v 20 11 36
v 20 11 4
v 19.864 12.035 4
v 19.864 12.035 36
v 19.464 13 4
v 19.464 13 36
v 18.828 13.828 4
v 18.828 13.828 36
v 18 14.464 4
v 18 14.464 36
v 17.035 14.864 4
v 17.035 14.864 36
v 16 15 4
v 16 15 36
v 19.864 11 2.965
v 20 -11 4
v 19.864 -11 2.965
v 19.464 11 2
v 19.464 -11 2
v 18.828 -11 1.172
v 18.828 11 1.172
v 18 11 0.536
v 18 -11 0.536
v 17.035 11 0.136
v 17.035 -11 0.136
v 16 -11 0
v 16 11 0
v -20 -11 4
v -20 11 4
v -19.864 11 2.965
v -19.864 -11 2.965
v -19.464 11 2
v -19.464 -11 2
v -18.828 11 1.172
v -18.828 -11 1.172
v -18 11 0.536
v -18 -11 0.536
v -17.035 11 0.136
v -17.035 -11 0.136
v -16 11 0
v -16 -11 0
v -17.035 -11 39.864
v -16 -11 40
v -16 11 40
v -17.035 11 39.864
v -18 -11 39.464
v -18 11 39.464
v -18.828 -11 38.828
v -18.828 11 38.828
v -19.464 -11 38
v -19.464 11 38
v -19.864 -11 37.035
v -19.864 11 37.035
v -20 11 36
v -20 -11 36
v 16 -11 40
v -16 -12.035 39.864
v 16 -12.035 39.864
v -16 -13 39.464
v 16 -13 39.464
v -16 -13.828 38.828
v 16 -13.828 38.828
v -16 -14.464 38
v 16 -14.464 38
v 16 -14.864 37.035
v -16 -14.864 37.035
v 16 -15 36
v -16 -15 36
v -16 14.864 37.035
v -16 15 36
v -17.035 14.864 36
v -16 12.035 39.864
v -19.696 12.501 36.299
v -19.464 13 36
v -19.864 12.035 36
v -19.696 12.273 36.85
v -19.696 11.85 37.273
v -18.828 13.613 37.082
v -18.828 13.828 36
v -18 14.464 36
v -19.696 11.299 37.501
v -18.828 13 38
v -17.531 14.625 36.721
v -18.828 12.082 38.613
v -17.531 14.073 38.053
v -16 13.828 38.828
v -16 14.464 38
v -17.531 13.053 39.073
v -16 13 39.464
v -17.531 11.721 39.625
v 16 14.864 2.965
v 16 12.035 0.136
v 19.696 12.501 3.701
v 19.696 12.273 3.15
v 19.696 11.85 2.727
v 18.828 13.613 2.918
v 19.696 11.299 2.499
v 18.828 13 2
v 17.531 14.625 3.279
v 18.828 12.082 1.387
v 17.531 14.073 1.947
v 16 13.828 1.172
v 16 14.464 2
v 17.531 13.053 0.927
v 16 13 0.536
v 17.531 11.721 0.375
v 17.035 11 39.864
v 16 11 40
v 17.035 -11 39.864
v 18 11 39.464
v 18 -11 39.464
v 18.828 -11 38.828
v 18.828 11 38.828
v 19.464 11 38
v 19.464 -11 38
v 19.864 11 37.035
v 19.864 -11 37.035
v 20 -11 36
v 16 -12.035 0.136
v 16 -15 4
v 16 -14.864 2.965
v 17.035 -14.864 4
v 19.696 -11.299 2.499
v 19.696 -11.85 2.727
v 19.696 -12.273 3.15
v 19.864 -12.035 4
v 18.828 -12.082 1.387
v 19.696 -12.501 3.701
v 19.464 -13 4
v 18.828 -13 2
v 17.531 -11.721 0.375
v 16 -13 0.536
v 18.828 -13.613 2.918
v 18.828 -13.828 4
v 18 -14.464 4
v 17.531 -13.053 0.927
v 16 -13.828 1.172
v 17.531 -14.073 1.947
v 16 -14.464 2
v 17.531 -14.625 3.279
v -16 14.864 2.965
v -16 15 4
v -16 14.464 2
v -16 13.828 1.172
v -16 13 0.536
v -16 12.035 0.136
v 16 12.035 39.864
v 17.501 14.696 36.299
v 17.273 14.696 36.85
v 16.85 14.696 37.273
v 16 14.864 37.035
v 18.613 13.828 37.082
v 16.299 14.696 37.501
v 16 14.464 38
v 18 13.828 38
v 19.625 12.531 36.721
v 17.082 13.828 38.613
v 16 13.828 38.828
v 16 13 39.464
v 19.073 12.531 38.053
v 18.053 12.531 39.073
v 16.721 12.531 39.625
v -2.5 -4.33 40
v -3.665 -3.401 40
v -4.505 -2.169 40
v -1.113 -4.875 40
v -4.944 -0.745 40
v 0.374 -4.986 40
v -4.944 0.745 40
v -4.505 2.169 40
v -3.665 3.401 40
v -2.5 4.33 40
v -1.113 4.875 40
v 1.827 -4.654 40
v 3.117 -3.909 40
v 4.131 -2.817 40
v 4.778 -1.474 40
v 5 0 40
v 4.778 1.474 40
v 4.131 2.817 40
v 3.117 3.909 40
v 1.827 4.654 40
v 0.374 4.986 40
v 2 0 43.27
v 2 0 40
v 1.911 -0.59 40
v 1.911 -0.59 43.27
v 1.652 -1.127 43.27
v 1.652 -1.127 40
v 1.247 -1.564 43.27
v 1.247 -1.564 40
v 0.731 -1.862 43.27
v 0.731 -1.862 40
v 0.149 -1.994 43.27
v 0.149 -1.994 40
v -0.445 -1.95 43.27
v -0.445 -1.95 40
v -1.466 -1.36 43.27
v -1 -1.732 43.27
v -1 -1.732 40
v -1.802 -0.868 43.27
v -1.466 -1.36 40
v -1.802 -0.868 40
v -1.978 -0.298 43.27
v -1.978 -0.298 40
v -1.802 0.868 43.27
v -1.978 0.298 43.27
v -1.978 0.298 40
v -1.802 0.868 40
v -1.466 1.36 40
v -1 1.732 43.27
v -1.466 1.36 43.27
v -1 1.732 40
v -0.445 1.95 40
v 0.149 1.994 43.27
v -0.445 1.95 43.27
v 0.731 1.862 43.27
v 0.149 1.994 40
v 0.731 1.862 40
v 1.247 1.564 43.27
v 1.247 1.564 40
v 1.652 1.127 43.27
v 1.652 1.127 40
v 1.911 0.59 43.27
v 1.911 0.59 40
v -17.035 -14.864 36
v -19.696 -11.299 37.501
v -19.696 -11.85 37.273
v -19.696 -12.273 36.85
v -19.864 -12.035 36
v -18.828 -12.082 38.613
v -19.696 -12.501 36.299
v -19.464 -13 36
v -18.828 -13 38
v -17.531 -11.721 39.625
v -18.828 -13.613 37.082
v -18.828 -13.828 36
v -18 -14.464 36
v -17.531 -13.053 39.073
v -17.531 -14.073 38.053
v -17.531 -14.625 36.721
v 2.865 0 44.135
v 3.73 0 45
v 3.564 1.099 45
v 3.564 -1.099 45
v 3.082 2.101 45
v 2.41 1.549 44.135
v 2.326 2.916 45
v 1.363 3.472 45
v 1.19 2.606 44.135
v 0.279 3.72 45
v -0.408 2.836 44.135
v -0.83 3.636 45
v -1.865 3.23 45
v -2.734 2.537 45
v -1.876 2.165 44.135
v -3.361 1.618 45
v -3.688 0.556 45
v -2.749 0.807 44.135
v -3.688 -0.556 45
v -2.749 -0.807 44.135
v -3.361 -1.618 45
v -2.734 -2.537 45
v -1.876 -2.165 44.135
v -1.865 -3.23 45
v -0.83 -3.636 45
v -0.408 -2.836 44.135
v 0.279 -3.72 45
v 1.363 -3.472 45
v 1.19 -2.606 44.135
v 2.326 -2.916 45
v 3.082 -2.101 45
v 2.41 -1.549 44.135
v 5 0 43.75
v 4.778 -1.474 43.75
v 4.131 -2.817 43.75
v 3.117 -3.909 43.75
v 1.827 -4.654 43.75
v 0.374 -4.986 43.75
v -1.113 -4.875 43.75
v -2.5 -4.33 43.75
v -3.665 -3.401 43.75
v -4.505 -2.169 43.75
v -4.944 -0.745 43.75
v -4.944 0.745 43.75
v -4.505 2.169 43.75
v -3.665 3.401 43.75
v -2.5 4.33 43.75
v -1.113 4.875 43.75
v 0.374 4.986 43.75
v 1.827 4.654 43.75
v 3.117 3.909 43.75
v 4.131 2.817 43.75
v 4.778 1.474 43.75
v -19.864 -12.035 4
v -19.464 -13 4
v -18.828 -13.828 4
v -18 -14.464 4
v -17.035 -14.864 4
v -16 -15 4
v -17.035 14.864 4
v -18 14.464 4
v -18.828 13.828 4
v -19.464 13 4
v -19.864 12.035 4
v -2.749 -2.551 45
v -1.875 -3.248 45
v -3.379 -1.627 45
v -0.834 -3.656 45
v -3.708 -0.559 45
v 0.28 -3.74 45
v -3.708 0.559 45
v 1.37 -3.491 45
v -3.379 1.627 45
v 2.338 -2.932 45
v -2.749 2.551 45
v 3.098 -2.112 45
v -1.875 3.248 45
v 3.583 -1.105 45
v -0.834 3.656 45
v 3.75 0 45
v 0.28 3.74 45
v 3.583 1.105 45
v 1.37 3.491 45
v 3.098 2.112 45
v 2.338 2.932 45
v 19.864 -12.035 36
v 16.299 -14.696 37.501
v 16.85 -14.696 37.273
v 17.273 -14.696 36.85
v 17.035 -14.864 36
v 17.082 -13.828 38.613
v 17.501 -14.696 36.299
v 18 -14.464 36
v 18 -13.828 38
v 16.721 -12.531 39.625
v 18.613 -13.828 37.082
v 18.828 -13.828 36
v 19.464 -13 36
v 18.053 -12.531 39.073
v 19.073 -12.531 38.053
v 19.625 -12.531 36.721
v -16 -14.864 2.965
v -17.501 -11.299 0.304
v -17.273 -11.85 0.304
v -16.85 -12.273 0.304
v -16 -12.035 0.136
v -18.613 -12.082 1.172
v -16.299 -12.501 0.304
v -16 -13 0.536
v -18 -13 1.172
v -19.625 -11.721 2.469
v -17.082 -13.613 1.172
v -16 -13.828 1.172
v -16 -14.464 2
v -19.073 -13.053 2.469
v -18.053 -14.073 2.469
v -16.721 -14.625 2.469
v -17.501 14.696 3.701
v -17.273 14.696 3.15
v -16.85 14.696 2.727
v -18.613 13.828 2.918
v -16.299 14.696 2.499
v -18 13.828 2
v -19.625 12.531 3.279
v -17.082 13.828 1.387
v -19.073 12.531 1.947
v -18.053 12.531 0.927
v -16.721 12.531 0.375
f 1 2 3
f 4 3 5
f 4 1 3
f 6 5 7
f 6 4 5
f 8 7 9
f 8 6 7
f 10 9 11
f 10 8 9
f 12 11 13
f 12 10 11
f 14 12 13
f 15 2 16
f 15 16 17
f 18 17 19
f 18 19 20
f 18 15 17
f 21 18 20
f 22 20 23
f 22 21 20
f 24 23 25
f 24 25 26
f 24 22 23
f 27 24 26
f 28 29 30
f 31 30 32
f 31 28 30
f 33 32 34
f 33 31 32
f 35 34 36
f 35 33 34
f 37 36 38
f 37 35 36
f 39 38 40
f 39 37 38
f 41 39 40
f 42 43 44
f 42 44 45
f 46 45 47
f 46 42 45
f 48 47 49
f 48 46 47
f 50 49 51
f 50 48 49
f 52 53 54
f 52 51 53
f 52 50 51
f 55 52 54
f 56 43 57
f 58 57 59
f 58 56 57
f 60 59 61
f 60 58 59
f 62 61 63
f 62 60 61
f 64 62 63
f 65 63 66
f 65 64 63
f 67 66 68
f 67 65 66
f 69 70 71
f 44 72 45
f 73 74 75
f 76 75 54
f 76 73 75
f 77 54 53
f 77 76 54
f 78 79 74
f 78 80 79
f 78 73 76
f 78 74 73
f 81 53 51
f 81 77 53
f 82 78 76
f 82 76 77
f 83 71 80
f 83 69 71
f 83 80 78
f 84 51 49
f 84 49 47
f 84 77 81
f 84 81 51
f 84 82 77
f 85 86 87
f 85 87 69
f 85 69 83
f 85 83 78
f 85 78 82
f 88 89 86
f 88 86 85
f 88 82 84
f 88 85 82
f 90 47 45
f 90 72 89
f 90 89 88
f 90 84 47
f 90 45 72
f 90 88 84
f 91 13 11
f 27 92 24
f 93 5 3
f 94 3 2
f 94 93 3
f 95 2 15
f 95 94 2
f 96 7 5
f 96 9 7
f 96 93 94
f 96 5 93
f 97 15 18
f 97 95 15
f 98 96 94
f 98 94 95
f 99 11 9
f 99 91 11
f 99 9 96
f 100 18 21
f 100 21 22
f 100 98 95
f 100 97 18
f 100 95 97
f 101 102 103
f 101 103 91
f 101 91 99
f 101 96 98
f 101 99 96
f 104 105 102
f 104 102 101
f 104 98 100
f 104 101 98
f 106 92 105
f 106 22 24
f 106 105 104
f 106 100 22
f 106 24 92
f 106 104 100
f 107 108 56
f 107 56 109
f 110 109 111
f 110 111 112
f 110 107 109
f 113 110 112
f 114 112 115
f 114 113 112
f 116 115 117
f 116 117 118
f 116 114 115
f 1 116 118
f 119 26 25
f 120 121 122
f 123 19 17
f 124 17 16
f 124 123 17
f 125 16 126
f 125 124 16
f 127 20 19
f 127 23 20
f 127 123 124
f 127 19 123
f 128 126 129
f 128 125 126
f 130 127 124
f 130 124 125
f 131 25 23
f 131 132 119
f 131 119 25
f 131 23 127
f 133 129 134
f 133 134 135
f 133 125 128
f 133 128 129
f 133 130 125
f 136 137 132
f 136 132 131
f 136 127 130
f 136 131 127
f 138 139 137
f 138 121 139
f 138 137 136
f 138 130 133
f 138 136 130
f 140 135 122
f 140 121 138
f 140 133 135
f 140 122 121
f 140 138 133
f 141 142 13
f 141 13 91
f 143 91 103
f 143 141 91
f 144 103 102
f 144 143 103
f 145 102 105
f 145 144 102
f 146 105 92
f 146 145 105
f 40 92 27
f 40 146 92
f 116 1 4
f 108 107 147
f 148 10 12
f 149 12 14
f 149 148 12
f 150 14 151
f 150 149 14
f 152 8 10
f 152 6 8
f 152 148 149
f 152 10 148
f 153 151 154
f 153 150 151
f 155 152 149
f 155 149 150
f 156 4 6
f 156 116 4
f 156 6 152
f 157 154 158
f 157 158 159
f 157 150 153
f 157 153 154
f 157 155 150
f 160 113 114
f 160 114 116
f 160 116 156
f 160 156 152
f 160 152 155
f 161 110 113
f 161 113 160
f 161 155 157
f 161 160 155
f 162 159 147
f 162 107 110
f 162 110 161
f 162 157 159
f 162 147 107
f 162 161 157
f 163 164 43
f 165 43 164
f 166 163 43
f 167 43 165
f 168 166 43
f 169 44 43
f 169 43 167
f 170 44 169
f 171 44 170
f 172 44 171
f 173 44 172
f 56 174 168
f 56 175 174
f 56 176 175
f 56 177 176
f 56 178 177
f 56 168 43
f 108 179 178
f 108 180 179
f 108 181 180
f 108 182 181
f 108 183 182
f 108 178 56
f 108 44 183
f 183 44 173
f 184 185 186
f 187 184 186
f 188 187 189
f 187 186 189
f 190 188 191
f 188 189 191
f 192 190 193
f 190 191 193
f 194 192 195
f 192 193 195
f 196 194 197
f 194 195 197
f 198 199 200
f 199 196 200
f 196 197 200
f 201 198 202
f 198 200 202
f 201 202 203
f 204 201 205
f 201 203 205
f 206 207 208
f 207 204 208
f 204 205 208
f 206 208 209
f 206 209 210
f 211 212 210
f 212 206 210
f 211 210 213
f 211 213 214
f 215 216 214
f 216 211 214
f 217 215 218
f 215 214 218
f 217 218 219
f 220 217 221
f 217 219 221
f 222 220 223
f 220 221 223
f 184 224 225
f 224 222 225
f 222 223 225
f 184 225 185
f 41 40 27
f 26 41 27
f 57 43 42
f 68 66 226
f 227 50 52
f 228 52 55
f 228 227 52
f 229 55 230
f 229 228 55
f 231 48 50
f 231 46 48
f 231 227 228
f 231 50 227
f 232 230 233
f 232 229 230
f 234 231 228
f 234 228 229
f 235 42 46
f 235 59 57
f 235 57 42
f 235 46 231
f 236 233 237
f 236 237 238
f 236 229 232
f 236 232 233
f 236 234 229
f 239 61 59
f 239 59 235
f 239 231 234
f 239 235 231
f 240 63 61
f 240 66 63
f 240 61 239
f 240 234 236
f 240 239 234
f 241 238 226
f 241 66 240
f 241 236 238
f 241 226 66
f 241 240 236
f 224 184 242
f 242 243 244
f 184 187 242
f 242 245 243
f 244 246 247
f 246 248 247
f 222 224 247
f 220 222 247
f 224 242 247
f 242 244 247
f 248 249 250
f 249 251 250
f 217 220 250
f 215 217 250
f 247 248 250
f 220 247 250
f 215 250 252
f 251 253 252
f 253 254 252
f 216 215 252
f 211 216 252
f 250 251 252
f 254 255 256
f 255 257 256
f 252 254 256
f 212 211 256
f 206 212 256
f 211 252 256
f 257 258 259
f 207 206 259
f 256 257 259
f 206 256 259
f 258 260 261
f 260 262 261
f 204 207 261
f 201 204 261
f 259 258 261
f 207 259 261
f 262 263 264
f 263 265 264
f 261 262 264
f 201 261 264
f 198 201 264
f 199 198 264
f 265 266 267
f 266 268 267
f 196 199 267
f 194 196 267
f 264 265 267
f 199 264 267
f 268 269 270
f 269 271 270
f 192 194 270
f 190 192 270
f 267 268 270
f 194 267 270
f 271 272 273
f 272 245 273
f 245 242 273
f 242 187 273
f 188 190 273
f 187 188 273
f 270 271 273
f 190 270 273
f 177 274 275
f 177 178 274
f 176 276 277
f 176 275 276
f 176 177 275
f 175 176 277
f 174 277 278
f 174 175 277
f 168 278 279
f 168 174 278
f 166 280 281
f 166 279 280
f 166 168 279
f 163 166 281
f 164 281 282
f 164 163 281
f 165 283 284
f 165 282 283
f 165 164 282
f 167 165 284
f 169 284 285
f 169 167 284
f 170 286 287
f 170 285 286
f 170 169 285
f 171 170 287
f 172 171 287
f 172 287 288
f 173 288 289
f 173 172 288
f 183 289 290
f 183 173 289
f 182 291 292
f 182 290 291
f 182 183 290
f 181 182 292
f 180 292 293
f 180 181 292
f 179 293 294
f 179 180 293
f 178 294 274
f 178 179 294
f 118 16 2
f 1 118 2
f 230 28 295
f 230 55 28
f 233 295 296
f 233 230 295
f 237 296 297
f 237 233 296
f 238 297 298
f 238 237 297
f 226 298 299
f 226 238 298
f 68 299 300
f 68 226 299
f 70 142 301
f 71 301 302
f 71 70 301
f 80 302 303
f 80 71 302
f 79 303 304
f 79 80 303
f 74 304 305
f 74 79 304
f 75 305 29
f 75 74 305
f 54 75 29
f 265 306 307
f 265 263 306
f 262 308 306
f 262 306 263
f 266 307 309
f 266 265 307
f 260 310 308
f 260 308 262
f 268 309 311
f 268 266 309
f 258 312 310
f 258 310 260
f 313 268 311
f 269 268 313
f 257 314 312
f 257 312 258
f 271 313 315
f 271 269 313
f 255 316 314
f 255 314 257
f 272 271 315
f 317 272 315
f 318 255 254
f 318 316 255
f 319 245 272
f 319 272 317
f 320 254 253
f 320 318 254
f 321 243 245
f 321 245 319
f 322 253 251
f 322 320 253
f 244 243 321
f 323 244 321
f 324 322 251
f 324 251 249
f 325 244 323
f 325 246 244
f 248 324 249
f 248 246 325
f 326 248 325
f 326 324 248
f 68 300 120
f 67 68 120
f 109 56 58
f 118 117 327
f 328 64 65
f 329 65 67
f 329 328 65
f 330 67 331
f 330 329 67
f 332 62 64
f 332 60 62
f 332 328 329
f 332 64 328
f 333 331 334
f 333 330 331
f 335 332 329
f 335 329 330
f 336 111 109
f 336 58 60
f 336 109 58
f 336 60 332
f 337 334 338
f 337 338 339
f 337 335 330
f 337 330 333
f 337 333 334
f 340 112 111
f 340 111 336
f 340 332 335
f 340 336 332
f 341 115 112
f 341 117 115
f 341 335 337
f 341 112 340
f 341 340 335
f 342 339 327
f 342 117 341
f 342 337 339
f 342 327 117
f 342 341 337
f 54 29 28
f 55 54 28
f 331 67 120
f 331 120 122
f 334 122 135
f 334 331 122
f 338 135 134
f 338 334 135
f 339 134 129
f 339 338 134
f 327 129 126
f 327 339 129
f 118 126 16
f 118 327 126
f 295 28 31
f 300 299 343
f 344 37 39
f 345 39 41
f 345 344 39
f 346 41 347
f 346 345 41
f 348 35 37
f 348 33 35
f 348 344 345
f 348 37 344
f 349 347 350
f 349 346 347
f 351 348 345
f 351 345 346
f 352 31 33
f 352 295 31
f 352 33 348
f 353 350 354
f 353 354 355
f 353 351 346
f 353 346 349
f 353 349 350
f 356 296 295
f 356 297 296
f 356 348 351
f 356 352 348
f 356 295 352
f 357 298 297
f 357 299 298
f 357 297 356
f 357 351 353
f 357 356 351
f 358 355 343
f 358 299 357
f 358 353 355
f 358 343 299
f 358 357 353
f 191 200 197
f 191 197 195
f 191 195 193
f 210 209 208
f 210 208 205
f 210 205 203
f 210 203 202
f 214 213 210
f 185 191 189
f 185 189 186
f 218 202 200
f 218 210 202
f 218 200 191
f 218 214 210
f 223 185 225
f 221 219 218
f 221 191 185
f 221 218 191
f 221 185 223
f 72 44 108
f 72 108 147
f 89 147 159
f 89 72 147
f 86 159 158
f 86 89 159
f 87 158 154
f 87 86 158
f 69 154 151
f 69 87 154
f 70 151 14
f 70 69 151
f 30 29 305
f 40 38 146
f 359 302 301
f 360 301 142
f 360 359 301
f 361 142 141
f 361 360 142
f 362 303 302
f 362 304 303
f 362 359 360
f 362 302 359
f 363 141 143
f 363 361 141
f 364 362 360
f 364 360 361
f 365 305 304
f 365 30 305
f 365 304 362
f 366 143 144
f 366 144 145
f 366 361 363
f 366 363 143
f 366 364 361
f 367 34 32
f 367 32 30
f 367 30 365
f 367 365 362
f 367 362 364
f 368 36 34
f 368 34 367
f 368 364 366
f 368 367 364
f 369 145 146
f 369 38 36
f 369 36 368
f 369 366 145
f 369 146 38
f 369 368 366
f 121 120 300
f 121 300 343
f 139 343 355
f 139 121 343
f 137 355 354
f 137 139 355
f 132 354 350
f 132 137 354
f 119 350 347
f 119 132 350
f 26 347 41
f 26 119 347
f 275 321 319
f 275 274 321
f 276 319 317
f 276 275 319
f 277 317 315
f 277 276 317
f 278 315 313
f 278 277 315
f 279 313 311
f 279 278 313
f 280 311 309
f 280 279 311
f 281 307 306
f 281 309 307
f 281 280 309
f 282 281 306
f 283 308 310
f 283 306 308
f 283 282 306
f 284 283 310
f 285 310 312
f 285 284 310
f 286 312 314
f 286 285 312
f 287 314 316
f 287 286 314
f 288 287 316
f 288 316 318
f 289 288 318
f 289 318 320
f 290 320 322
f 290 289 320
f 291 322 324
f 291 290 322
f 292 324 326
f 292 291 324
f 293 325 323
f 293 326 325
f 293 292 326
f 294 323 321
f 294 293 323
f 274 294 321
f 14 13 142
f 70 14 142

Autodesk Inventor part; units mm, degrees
ref_plane "YZ Plane" through (0, 0, 0) normal (1, 0, 0) x (0, 1, 0)
ref_plane "XZ Plane" through (0, 0, 0) normal (0, 1, 0) x (-1, 0, 0)
ref_plane "XY Plane" through (0, 0, 0) normal (0, 0, 1) x (1, 0, 0)
sketch "Esboço1" plane through (0, 0, 0) normal (0, 0, 1) x (1, 0, 0)
  line L0 (-20, -15) -> (20, -15)
  line L1 (20, -15) -> (20, 15)
  line L2 (20, 15) -> (-20, 15)
  line L3 (-20, 15) -> (-20, -15)
  line L4 (-20, -15) -> (20, 15) construction
  line L5 (20, -15) -> (-20, 15) construction
  point P0 (0, 0)
  dimension "d0" = 30
  dimension "d1" = 40
extrude "Extrusão1" add sketch "Esboço1" along normal blind 40
fillet "Arredondamento1" radius 4 12 edges at (20, 0, 40) (0, 15, 40) (0, -15, 40) (-20, 0, 40) (-20, -15, 20) (-20, 0, 0) (0, 15, 0) (-20, 15, 20) (0, -15, 0) (20, 0, 0) (20, 15, 20) (20, -15, 20)
sketch "Esboço2" plane through (0, 0, 40) normal (0, 0, 1) x (1, 0, 0)
  circle A0 centre (0, 0) radius 5
  circle A1 centre (0, 0) radius 2
  dimension "d5" = 10
  dimension "d8" = 3
extrude "Extrusão2" add sketch "Esboço2" along normal blind 5 contours A0 | A1
extrude "Extrusão3" cut sketch "Esboço2" along normal blind 5 contours A1
chamfer "Chanfro1" distance 1.25 angle 45 1 edges at (-5, 0, 45)
chamfer "Chanfro2" distance 1.73 angle 45 1 edges at (-2, 0, 45)
properties part number "fonte IC"
